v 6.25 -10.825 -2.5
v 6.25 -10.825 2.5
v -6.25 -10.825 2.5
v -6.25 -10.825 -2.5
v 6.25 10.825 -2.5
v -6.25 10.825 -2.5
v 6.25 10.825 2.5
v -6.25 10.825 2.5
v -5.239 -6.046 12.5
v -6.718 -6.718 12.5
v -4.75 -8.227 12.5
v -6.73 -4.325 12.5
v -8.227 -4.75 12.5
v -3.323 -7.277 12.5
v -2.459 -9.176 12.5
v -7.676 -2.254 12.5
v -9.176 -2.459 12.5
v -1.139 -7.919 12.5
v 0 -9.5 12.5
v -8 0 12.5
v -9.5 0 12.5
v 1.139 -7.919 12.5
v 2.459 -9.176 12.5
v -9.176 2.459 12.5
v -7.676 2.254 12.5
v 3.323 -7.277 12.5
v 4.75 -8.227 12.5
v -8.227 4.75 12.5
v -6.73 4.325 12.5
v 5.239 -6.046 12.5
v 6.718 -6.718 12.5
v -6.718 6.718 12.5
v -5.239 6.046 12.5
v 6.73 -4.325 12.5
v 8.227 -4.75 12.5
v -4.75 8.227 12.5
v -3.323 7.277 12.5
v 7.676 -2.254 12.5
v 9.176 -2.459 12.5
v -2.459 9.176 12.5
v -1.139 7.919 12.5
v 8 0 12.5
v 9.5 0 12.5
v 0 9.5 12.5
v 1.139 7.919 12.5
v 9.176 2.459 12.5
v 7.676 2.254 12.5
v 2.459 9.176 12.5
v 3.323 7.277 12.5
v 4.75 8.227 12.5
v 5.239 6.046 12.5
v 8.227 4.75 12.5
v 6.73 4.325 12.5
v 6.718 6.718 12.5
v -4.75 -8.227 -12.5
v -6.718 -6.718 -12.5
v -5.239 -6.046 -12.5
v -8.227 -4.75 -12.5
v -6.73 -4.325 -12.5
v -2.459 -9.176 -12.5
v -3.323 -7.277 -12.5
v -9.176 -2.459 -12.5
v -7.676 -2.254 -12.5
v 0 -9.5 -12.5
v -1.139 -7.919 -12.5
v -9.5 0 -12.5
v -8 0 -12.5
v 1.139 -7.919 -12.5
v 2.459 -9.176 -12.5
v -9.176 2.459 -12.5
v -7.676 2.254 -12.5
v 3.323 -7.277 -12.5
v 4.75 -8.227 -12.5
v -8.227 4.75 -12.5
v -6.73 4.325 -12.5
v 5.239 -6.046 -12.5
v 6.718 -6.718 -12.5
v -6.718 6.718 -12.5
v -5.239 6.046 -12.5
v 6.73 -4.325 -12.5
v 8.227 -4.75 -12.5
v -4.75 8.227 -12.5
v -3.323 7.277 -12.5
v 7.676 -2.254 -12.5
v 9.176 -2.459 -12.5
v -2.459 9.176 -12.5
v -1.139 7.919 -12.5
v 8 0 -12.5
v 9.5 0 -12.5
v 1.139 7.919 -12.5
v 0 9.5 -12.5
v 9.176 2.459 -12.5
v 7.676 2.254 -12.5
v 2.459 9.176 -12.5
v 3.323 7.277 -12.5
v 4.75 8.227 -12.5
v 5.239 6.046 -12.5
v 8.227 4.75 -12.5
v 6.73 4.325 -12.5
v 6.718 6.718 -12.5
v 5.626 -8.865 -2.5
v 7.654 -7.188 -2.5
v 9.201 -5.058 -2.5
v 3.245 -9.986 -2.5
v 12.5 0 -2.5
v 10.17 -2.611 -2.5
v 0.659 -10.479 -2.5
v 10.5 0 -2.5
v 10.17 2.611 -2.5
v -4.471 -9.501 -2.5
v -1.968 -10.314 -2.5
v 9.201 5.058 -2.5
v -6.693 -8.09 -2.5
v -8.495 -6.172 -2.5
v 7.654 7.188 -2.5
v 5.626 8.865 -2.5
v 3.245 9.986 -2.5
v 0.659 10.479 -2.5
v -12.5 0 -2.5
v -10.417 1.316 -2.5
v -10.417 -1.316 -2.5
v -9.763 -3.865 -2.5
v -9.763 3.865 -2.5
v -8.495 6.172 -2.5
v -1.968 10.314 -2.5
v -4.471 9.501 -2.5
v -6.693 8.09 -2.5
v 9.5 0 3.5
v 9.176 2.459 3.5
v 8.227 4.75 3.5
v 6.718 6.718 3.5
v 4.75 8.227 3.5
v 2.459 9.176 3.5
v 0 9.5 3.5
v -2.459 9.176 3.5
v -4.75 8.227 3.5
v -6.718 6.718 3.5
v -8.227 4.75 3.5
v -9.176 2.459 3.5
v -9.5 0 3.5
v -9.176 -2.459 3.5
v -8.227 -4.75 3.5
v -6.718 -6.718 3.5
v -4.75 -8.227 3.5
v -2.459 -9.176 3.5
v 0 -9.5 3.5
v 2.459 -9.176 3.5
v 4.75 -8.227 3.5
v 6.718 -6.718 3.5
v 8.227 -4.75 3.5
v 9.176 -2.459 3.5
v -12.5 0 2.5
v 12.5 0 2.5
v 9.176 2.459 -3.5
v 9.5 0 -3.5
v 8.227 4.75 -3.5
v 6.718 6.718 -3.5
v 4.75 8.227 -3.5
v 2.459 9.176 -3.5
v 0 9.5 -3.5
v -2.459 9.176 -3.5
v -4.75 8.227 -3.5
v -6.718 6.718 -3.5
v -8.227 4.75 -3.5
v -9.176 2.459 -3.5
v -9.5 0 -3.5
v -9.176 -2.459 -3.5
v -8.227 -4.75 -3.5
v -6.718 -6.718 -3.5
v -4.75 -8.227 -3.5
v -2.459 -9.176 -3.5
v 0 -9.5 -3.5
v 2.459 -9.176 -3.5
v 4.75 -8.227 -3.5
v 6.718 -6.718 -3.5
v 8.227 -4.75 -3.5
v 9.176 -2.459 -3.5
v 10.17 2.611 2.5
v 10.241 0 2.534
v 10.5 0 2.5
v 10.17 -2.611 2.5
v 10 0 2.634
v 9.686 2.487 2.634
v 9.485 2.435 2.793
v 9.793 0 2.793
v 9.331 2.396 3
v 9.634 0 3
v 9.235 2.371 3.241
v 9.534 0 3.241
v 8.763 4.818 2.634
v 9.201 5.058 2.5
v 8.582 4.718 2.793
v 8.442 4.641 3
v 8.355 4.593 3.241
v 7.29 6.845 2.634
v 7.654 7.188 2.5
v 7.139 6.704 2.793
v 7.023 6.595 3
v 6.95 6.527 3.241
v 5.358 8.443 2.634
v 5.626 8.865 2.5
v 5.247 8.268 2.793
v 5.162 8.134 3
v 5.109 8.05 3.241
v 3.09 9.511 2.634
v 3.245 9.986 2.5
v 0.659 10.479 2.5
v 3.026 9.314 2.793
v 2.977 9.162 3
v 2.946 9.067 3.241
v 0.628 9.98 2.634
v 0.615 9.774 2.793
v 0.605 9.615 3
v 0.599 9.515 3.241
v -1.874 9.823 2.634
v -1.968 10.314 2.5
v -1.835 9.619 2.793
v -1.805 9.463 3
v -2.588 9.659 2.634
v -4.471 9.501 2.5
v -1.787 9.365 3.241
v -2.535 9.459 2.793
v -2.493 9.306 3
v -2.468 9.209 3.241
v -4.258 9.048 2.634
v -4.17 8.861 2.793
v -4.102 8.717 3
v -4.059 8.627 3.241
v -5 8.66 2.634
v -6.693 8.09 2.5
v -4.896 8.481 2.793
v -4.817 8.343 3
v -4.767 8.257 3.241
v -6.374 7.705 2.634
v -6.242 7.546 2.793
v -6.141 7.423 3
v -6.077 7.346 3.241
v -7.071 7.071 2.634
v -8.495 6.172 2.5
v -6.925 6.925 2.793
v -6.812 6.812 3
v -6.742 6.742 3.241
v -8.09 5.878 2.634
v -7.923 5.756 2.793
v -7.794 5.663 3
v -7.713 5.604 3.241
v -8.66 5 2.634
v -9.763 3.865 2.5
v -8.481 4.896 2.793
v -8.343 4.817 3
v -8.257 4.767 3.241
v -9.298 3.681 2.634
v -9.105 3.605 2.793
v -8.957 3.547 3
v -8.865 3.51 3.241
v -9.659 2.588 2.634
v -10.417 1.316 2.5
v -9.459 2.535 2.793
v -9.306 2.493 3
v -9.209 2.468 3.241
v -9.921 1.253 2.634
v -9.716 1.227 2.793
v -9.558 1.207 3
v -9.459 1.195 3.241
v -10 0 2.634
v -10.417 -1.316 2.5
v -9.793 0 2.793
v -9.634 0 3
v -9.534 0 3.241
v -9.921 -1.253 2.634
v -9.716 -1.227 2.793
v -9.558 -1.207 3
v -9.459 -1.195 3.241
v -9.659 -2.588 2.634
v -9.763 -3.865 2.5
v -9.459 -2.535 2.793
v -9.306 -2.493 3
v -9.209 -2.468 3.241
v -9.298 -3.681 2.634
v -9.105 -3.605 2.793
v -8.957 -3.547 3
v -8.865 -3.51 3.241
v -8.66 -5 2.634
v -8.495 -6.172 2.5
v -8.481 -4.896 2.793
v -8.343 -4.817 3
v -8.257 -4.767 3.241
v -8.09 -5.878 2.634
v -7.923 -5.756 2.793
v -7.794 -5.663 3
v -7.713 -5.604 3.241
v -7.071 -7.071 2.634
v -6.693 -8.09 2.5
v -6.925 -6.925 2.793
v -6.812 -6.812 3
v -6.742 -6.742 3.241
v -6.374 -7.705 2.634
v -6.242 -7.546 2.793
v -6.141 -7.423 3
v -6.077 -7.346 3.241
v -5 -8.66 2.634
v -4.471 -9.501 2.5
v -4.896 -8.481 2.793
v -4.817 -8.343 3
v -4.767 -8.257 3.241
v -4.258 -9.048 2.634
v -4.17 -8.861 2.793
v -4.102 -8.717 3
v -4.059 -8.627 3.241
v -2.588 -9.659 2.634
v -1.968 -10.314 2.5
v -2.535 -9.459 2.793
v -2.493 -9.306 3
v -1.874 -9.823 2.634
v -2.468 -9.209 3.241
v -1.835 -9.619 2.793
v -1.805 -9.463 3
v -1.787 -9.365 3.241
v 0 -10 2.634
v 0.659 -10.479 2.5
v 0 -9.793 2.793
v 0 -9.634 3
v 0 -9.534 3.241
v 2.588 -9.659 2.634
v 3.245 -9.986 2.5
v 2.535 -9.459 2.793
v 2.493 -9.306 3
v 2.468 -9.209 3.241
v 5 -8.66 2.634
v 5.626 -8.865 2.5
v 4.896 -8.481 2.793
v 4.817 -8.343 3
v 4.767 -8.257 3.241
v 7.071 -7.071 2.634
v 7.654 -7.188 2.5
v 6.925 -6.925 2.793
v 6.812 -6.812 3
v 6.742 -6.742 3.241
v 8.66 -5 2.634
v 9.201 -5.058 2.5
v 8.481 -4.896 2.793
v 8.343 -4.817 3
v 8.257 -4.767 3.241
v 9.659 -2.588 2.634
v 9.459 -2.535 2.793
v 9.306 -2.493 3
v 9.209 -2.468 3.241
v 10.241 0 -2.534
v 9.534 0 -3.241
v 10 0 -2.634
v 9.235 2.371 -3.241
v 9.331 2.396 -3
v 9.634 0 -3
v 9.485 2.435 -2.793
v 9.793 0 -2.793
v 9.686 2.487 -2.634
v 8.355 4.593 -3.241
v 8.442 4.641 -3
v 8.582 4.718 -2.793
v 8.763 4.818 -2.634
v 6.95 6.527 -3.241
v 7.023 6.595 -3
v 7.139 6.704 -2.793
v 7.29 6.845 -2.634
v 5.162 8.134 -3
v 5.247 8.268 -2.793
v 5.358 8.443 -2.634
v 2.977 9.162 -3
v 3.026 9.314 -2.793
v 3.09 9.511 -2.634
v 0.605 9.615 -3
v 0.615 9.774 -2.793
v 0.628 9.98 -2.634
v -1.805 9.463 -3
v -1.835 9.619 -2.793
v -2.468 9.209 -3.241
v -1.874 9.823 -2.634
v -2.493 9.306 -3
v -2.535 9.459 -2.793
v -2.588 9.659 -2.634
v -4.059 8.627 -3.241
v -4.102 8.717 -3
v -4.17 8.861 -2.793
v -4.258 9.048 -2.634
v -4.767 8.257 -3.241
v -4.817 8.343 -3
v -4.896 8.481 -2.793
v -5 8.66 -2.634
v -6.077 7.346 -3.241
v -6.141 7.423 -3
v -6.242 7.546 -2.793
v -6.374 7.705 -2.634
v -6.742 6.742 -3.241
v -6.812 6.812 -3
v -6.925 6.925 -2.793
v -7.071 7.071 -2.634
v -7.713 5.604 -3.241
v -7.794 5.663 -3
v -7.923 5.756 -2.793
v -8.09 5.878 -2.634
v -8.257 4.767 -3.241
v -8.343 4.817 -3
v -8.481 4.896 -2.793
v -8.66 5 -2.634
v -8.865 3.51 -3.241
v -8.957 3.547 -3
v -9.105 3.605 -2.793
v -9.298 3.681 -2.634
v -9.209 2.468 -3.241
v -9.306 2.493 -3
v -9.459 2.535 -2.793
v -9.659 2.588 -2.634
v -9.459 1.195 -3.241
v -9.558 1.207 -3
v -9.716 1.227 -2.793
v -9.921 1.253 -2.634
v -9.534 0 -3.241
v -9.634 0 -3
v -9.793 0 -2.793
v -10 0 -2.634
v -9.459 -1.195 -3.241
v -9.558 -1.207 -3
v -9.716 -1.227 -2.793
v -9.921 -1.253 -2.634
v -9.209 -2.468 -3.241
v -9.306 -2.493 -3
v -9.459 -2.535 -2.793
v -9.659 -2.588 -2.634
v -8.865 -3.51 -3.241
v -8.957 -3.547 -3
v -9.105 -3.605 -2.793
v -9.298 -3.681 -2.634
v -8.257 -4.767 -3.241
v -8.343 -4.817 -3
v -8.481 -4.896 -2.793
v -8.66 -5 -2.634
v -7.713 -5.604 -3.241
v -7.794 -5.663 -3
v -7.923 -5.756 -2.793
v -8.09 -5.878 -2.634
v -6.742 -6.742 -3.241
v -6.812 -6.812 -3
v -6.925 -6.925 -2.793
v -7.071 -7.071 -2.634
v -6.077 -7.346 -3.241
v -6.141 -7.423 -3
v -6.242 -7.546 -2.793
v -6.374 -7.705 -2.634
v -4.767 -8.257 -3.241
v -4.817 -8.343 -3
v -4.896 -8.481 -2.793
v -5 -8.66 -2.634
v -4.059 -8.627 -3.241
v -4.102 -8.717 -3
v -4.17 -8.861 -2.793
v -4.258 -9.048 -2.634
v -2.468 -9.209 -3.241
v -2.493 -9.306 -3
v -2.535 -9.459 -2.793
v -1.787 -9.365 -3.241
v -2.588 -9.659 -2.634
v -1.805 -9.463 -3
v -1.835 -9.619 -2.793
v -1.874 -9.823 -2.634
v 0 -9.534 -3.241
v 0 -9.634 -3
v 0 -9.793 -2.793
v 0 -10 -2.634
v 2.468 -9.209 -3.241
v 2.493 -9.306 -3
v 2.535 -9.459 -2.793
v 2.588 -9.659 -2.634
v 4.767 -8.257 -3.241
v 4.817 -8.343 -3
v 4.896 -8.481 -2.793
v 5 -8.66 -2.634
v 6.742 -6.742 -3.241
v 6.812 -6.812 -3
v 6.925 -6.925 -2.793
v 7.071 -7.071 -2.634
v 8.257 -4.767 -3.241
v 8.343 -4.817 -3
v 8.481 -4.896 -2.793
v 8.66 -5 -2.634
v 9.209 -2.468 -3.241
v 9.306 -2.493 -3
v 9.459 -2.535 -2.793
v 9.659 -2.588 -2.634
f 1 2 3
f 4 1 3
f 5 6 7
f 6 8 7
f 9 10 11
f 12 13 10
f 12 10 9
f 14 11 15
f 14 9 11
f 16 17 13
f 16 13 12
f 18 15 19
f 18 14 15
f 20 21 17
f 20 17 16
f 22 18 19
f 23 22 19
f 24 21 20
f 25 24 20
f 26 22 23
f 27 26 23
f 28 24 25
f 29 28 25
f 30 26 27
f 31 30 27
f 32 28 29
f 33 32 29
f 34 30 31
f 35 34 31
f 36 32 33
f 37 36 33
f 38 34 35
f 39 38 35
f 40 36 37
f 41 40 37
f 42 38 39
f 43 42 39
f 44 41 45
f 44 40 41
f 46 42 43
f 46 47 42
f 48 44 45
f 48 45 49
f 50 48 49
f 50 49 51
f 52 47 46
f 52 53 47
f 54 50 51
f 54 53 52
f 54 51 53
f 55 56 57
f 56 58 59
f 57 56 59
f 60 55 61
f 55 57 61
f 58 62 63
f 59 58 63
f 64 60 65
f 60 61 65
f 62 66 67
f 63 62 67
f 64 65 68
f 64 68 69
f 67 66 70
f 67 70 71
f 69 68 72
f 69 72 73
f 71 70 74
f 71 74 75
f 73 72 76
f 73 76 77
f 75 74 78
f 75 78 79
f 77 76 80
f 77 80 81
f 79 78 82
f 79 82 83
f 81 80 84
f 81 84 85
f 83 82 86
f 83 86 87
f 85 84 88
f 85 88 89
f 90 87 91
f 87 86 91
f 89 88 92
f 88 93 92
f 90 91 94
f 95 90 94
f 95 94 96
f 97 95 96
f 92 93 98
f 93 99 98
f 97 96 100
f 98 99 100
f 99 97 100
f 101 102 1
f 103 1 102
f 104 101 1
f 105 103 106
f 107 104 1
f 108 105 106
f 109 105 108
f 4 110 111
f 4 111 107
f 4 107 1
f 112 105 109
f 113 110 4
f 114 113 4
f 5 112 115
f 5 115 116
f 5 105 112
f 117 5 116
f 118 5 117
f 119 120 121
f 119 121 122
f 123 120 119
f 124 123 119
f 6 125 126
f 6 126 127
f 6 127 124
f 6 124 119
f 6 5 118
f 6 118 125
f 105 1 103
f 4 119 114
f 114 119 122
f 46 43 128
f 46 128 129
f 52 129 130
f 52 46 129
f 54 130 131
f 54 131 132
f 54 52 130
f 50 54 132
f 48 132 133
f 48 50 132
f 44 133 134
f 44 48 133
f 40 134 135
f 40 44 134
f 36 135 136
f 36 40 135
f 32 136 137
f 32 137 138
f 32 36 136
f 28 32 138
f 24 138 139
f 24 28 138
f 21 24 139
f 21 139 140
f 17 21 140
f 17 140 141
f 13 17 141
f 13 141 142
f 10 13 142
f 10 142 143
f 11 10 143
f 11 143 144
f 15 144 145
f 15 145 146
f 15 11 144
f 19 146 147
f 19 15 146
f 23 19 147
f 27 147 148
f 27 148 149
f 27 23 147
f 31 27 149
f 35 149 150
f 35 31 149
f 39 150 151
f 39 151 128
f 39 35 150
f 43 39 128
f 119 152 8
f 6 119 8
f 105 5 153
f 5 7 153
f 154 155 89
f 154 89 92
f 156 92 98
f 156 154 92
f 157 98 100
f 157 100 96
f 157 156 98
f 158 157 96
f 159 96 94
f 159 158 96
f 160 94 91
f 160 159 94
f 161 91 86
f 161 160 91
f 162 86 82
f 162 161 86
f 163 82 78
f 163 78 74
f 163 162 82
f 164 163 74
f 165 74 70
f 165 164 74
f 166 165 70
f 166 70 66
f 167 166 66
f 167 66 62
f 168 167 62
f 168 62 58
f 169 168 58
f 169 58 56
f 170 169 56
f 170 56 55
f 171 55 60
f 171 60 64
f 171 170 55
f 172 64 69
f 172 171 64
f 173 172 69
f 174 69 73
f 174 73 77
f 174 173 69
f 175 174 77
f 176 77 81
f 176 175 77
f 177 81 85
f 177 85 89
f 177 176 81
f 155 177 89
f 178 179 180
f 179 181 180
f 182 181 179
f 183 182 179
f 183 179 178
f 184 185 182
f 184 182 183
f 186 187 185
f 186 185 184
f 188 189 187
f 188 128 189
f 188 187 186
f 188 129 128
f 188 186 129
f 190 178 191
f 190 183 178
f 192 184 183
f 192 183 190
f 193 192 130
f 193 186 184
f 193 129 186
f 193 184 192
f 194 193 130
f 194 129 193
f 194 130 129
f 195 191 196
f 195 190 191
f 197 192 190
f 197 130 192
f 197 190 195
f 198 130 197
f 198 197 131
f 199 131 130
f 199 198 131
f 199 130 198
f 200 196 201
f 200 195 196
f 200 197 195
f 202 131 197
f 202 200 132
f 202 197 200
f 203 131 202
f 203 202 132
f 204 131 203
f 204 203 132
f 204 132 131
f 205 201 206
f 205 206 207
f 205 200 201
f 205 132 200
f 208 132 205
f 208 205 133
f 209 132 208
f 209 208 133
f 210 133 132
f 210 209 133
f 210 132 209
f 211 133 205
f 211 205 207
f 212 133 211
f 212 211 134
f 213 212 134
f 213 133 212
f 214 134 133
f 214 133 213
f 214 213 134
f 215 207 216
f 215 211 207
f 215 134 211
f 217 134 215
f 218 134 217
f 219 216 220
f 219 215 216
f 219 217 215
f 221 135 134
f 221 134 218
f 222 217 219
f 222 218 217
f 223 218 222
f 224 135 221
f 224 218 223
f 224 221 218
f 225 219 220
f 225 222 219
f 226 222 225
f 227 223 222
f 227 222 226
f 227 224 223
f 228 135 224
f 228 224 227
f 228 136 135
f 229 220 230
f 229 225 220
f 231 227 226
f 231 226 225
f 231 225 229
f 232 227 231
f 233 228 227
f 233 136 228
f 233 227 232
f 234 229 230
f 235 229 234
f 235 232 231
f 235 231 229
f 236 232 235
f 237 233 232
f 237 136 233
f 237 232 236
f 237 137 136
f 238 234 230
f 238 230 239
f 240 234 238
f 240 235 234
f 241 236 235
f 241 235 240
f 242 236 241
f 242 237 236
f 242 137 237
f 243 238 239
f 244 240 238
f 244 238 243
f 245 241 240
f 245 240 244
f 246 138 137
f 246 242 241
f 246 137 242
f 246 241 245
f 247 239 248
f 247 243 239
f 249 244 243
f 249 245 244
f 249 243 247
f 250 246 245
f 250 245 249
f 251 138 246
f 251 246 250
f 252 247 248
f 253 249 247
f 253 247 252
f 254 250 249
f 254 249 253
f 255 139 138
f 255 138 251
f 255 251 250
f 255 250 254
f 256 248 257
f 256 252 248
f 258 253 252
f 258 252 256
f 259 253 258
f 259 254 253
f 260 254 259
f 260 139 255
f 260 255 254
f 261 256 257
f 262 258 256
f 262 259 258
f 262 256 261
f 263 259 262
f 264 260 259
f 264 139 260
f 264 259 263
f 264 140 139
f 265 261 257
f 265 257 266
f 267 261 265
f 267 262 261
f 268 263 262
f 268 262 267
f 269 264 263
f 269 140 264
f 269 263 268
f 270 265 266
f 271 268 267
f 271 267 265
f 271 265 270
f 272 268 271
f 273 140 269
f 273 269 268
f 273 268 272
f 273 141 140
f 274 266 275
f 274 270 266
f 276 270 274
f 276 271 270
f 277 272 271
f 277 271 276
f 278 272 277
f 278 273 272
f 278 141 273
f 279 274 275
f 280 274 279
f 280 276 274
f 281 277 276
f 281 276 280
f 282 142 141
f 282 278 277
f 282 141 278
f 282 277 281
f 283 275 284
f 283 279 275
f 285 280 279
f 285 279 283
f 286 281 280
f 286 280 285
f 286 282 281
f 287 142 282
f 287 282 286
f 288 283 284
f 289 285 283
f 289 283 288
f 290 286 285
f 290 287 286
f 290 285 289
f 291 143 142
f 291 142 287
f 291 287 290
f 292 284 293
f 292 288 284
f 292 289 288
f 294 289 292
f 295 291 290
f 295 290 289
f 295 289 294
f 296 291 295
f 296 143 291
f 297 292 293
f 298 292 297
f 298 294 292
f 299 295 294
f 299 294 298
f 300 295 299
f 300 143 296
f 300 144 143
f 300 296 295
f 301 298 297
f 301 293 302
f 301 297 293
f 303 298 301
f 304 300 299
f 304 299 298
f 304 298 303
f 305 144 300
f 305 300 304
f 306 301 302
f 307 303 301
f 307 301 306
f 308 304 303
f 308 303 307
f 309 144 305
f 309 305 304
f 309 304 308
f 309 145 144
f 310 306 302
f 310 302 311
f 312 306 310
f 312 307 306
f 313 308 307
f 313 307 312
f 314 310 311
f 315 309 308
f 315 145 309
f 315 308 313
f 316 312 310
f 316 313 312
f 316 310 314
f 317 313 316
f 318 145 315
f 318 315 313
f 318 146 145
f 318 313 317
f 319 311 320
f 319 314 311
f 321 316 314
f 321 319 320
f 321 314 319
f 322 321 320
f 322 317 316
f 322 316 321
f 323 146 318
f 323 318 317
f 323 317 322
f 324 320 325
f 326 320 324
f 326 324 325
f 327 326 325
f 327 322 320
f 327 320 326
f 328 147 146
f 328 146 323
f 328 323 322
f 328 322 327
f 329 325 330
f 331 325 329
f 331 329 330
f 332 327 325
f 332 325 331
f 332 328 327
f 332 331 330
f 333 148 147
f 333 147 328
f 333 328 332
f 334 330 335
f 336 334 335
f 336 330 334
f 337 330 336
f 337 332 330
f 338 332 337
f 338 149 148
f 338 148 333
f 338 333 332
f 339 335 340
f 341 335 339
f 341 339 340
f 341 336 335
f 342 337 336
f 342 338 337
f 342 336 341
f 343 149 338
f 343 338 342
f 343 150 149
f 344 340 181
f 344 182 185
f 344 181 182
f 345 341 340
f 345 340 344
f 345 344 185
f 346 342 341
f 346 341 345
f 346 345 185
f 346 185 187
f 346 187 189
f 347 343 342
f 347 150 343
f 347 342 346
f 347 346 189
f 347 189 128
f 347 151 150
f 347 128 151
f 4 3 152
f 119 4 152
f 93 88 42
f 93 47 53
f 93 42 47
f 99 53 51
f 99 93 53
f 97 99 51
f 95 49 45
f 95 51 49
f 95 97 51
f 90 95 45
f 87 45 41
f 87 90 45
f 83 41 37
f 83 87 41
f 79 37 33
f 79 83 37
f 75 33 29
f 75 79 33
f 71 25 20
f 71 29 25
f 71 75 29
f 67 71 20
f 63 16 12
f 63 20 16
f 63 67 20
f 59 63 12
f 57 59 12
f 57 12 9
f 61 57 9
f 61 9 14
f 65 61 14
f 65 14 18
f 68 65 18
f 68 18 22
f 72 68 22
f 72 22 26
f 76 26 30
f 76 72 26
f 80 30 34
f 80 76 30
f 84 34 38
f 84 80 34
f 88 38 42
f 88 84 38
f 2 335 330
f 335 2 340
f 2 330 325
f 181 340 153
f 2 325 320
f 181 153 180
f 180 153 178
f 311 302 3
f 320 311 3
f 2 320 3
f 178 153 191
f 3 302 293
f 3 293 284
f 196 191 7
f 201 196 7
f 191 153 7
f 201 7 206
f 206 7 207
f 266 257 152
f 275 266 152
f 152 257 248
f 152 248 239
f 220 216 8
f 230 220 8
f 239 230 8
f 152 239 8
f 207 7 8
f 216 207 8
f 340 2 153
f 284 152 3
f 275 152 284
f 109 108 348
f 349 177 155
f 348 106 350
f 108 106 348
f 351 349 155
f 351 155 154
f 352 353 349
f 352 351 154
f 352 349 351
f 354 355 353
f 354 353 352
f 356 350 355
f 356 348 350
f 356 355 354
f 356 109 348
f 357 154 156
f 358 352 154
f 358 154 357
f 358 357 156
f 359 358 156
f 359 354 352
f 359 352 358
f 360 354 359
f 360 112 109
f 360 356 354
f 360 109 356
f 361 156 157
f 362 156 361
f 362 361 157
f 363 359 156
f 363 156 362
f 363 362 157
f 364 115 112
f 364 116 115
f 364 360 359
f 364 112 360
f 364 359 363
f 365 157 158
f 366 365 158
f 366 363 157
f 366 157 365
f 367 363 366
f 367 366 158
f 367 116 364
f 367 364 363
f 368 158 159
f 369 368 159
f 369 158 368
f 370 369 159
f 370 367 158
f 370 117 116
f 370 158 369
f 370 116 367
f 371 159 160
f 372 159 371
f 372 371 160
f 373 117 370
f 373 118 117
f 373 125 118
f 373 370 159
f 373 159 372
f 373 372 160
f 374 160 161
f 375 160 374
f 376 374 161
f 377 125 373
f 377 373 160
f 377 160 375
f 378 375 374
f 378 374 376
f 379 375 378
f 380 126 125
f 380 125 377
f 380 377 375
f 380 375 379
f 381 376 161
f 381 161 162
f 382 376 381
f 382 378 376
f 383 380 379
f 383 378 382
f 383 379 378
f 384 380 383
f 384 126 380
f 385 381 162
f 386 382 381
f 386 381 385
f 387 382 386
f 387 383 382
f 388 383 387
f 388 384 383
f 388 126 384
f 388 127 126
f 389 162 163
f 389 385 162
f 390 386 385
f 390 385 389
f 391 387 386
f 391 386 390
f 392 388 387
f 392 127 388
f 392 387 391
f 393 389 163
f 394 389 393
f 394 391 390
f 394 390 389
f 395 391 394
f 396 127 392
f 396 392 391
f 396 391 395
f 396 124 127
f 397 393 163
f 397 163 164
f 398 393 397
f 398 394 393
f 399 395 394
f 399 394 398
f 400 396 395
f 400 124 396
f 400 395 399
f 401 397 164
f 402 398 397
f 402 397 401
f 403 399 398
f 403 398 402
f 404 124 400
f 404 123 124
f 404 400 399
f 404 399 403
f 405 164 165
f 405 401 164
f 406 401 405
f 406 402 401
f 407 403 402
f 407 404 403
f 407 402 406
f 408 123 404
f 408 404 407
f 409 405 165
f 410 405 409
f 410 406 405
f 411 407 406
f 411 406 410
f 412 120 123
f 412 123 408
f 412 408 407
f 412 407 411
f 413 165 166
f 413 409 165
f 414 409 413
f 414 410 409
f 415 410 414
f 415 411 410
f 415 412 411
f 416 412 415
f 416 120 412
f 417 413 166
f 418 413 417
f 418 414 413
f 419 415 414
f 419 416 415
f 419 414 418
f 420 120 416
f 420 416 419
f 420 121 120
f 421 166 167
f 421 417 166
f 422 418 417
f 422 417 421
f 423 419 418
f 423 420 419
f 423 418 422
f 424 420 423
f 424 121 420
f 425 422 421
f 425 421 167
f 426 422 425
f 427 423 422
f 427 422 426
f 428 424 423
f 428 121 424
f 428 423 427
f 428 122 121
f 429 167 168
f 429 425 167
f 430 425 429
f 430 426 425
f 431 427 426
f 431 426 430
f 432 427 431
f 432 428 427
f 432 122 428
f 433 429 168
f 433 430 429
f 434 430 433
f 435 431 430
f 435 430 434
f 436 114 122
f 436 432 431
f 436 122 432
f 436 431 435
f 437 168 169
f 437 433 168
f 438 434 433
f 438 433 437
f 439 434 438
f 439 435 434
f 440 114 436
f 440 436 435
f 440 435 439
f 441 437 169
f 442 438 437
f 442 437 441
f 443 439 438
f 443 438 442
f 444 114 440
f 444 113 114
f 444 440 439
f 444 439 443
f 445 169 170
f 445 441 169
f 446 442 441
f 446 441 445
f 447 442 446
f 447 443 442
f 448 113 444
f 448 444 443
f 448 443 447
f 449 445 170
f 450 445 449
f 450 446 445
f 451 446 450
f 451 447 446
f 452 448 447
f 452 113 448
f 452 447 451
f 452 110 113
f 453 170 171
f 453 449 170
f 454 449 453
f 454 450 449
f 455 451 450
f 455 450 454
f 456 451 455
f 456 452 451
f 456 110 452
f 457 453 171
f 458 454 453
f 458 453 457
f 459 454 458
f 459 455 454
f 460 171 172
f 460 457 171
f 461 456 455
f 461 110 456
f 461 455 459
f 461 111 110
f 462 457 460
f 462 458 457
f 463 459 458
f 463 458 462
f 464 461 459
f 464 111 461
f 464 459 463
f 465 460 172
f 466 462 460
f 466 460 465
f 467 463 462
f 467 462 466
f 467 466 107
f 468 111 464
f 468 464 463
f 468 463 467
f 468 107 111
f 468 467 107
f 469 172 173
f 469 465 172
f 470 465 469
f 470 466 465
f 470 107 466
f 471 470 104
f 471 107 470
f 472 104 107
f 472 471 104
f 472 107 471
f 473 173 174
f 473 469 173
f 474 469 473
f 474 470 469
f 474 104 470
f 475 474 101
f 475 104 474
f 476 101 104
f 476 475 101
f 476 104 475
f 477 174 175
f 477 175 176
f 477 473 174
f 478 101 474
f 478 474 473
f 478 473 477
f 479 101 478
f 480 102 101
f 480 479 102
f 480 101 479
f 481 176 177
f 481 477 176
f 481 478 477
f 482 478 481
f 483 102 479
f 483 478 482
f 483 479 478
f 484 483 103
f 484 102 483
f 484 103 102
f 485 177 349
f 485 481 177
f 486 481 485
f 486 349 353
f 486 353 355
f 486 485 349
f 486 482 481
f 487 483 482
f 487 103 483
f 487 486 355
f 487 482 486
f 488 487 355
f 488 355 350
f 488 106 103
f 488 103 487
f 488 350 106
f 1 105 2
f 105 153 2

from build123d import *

# Parameters (mm, degrees)
BOSS_EXTRUDE1_DEPTH     = 2.5
SKETCH2_R               = 9.5
BOSS_EXTRUDE2_DEPTH     = 12.5
CUT_EXTRUDE1_DEPTH      = 21.72890494
CUT_EXTRUDE1_DEPTH_BACK = 21.72890494
SKETCH3_R               = 8
FILLET1_R               = 1


with BuildPart() as part:
    # Sketch1 → Boss-Extrude1 (new, symmetric)
    with BuildSketch(Plane.XY):
        Polygon((-12.5, 0), (-6.25, 10.825317547), (6.25, 10.825317547), (12.5, 0), (6.25, -10.825317547), (-6.25, -10.825317547), align=None)
    extrude(amount=BOSS_EXTRUDE1_DEPTH, both=True)

    # Sketch2 → Boss-Extrude2 (add, symmetric)
    with BuildSketch(Plane.XY):
        Circle(SKETCH2_R)
    extrude(amount=BOSS_EXTRUDE2_DEPTH, both=True)

    # Sketch3 → Cut-Extrude1 (cut, two sides: drawn at the far end of the back side and taken through both)
    with BuildSketch(Plane.XY.offset(-CUT_EXTRUDE1_DEPTH_BACK)):
        Circle(SKETCH3_R)
    extrude(amount=CUT_EXTRUDE1_DEPTH + CUT_EXTRUDE1_DEPTH_BACK, mode=Mode.SUBTRACT)

    # Fillet1
    fillet1_edges = [part.edges().sort_by_distance(p)[0] for p in [
        (-9.5, 0, -2.5),
        (-9.5, 0, 2.5),
    ]]
    fillet(fillet1_edges, radius=FILLET1_R)


solid = part.part
